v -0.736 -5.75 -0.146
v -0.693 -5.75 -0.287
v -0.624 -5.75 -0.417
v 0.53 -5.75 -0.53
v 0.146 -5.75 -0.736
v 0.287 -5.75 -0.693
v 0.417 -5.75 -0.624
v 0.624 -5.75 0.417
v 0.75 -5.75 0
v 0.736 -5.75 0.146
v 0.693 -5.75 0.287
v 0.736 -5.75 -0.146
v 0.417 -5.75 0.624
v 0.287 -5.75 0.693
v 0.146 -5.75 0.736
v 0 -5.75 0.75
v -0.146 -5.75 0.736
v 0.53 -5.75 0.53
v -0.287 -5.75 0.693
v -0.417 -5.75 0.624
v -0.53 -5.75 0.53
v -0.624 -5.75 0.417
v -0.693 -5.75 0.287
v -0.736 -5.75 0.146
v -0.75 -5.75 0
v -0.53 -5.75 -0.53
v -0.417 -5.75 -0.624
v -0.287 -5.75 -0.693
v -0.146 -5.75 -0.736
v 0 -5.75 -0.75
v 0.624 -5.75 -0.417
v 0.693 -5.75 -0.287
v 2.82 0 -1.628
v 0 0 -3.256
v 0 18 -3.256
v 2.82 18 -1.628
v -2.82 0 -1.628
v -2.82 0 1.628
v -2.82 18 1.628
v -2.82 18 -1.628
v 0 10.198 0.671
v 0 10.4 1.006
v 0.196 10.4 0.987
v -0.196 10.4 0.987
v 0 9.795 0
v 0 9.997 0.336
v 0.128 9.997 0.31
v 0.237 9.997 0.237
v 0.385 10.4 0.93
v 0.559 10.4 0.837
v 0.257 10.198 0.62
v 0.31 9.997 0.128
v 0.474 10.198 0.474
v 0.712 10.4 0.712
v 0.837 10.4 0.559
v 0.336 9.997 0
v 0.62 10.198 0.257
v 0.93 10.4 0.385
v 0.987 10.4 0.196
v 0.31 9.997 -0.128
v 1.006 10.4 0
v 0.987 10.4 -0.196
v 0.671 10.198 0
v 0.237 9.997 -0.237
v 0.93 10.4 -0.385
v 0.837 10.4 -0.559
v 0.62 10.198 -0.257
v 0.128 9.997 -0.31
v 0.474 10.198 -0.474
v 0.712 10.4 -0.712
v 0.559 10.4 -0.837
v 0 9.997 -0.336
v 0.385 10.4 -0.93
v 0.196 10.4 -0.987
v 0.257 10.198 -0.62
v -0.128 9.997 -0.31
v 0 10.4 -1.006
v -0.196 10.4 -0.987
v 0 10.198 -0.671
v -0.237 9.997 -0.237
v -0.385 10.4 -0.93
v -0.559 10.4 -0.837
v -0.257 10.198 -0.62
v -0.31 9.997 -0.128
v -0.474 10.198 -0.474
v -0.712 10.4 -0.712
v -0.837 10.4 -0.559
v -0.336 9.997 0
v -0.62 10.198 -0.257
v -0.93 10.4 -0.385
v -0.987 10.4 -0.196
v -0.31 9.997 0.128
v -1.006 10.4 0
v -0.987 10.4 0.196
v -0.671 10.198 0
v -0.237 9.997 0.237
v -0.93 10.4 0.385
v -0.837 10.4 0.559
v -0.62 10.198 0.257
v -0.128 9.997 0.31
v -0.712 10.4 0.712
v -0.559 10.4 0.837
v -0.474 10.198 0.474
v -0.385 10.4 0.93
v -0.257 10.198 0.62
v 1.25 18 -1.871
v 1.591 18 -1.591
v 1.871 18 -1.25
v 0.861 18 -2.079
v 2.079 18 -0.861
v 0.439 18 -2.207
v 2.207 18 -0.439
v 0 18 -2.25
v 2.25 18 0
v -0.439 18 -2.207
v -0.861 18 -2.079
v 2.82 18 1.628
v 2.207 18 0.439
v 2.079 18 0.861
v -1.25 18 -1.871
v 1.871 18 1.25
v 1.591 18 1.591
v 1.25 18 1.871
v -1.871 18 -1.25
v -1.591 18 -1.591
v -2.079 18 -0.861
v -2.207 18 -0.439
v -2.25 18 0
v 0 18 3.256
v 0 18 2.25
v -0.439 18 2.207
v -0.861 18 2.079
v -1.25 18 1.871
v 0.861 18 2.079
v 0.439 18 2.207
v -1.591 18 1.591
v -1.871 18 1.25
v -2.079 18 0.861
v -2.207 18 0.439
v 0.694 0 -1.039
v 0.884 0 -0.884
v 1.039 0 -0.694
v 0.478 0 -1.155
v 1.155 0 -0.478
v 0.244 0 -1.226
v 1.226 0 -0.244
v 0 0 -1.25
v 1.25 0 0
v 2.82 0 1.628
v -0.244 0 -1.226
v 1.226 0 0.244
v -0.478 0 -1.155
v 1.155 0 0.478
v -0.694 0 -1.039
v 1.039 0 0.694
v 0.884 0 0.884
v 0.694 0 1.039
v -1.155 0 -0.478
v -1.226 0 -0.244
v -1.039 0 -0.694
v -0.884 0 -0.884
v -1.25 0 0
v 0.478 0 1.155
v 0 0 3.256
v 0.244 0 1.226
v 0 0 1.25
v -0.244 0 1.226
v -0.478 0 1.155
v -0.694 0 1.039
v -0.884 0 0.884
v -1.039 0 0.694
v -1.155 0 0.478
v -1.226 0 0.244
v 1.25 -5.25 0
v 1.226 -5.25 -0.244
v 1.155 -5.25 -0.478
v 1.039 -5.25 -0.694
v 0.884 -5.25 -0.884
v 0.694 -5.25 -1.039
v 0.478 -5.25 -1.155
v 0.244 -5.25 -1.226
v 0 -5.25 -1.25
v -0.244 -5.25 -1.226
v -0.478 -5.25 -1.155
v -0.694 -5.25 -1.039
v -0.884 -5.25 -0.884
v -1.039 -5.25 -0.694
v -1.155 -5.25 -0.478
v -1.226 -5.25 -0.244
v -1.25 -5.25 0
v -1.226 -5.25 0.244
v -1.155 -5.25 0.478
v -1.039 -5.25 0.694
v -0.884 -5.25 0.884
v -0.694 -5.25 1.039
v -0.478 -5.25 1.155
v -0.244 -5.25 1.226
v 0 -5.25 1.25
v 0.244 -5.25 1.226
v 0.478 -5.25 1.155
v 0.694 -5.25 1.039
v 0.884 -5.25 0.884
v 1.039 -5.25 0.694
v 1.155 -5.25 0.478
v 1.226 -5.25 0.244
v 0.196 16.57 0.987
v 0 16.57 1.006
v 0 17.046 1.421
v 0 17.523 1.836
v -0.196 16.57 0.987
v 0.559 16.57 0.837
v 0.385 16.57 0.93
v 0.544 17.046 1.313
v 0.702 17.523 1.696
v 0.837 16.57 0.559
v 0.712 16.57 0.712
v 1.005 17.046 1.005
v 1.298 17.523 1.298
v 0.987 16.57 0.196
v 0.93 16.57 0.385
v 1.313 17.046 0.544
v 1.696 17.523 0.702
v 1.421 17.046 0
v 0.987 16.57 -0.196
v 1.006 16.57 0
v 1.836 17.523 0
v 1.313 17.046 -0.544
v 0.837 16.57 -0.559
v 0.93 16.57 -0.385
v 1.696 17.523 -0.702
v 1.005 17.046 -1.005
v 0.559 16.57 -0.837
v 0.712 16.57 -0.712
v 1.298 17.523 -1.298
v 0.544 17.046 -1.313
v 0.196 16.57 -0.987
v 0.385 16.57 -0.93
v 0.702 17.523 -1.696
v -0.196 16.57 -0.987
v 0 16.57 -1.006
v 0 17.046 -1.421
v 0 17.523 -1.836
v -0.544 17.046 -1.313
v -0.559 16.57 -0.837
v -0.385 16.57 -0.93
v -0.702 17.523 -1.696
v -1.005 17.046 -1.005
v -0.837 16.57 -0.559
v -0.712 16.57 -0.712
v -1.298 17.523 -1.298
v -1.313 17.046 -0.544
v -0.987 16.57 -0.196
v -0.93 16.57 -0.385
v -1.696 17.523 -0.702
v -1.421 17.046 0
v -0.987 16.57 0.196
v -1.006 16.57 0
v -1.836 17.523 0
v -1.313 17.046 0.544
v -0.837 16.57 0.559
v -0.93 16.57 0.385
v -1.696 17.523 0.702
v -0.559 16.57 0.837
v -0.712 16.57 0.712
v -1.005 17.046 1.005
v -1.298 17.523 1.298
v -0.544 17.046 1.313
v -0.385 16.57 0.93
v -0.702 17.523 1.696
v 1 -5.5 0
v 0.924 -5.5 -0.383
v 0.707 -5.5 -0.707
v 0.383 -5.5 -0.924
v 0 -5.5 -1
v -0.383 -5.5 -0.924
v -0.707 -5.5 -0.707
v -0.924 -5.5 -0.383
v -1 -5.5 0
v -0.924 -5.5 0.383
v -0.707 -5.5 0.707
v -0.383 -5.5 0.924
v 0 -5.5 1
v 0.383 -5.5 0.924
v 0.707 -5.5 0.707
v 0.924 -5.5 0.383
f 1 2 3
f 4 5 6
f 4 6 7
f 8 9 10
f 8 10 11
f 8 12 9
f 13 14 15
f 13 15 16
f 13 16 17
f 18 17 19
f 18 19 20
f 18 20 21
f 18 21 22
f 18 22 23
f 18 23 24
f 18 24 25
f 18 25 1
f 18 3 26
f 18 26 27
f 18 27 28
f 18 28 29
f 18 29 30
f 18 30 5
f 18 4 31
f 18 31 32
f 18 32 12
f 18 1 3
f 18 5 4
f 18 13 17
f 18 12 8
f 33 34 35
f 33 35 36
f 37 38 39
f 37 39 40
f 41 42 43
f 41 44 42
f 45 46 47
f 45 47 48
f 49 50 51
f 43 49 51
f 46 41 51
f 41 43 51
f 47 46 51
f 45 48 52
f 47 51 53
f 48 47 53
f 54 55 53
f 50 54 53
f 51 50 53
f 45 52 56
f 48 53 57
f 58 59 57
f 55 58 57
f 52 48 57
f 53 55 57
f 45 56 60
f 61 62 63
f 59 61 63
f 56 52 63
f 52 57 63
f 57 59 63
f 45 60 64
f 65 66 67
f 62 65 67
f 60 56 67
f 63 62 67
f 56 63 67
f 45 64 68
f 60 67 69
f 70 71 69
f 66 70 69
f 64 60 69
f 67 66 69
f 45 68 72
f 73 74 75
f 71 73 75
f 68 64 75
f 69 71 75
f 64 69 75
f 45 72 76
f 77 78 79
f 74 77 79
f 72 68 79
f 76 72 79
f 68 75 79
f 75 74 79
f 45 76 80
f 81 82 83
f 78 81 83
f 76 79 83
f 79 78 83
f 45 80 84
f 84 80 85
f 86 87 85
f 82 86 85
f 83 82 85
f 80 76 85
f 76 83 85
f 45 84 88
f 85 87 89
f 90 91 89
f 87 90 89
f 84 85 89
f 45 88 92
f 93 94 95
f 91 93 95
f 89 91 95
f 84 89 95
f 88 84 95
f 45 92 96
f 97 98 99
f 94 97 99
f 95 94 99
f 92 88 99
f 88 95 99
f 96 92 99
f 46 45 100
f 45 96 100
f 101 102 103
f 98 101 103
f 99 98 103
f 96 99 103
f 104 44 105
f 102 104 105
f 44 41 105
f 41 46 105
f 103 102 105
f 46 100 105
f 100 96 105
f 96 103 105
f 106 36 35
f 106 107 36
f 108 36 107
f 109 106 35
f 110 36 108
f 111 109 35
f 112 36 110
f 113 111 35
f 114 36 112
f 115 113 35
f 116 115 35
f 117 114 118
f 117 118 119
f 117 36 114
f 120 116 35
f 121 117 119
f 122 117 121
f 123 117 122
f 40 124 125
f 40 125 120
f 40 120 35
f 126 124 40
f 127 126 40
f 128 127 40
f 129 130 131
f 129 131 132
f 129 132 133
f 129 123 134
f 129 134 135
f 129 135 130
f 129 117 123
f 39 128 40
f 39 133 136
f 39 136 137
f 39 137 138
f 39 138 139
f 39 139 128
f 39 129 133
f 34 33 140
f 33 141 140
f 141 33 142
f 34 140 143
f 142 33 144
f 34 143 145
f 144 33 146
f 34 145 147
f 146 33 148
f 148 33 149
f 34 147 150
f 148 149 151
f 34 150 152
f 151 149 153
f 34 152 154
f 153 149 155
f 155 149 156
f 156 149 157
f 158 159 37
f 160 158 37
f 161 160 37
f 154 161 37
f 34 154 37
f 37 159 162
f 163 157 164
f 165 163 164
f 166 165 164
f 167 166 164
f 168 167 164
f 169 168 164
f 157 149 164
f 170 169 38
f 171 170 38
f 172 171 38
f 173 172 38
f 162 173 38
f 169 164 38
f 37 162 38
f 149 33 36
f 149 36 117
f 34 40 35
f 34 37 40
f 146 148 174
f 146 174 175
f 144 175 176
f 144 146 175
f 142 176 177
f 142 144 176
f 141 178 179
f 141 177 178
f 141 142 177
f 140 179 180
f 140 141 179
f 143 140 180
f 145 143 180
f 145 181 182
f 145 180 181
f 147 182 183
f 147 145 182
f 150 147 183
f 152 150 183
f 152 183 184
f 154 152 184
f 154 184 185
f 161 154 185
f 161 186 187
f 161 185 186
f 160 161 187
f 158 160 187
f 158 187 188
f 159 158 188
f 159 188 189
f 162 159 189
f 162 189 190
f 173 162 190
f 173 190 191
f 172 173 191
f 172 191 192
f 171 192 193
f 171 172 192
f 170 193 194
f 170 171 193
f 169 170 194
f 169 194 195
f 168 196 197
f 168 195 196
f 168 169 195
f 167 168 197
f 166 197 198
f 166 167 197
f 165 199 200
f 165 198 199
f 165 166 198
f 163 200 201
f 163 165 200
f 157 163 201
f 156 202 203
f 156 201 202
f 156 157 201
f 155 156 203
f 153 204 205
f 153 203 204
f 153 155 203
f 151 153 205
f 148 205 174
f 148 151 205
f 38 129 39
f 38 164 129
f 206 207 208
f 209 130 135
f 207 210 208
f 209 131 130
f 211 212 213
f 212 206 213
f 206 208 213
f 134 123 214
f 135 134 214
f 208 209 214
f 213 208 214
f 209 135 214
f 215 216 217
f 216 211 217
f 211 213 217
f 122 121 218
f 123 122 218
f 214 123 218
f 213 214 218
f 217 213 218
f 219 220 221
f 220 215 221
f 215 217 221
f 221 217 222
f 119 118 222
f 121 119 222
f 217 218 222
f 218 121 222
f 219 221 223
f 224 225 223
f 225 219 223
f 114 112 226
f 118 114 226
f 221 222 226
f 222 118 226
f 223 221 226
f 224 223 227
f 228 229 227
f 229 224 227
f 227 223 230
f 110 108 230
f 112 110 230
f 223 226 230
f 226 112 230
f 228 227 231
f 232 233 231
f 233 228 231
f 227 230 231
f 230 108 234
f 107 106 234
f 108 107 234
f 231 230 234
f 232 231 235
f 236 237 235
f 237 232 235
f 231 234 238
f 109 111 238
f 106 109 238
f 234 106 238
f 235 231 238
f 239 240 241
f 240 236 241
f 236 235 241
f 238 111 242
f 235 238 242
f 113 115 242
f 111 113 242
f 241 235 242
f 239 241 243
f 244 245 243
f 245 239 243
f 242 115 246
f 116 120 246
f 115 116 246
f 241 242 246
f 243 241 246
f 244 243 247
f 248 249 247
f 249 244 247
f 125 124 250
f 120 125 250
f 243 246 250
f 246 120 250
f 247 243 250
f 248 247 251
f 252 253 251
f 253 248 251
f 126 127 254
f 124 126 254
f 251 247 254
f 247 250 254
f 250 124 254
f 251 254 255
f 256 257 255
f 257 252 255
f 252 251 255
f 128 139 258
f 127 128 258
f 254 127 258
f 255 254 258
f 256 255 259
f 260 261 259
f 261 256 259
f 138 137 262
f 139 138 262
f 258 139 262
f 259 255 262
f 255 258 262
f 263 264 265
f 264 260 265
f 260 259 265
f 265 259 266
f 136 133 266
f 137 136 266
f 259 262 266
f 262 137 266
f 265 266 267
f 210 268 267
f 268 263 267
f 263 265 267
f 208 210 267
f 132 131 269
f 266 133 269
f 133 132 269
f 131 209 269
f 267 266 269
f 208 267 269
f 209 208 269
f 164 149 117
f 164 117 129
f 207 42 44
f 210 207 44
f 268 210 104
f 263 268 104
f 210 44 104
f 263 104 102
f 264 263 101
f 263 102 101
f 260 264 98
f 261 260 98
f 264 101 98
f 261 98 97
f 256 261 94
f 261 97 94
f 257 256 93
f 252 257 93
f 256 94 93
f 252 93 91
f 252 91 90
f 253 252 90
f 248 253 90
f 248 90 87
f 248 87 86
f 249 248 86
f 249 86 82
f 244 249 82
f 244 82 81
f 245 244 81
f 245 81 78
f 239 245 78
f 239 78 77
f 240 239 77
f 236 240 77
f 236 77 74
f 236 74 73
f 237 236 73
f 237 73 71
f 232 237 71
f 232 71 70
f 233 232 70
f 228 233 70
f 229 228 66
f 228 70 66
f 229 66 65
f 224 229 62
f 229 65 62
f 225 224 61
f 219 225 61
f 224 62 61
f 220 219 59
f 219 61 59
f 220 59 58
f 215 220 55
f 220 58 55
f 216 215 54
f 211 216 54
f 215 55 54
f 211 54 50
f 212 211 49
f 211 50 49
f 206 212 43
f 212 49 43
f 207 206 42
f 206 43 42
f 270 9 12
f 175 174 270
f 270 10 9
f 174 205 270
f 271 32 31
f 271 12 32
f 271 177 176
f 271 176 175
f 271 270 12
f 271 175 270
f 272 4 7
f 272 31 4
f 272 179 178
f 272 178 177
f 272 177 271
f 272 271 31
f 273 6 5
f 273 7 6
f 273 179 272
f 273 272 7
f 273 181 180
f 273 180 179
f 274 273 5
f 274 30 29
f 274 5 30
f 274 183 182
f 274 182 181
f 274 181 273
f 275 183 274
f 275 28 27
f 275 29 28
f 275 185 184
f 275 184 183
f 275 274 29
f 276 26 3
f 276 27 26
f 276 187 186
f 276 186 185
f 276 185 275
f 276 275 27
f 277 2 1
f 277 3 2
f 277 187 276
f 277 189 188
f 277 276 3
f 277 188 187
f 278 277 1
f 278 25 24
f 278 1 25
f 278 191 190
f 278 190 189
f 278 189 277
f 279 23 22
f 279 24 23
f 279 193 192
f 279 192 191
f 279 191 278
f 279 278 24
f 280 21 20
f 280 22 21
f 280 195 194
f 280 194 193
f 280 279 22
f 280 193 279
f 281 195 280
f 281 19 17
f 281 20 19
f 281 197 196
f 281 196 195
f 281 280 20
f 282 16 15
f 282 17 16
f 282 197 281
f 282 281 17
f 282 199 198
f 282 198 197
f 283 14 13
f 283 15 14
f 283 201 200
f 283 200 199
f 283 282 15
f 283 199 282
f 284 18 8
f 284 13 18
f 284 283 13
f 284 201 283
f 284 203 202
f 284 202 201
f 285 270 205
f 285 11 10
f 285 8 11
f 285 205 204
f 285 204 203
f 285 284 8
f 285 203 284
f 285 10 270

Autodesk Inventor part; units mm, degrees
ref_plane "YZ Plane" through (0, 0, 0) normal (1, 0, 0) x (0, 1, 0)
ref_plane "XZ Plane" through (0, 0, 0) normal (0, 1, 0) x (-1, 0, 0)
ref_plane "XY Plane" through (0, 0, 0) normal (0, 0, 1) x (1, 0, 0)
sketch "Sketch1" plane through (0, 0, 0) normal (0, 1, 0) x (-1, 0, 0)
  line L0 (0, 3.2563) -> (2.82, 1.6281)
  line L1 (2.82, 1.6281) -> (2.82, -1.6281)
  line L2 (2.82, -1.6281) -> (0, -3.2563)
  line L3 (0, -3.2563) -> (-2.82, -1.6281)
  line L4 (-2.82, -1.6281) -> (-2.82, 1.6281)
  line L5 (-2.82, 1.6281) -> (0, 3.2563)
  point P0 (0, 0)
  point P1 (0, 0)
  dimension "d0" = 5.64
extrude "Extrusion1" add sketch "Sketch1" along normal blind 18
sketch "Sketch2" plane through (0, 18, 0) normal (0, 1, 0) x (1, 0, 0)
  point P0 (0, 0)
  point P1 (0, 0)
hole "Hole1" at (0, 18, 0) direction (0, -1, 0) diameter 2.013 depth 7.6 tip angle 118 countersink diameter 4.5 countersink angle 82 thread size "M2.5x0.45" class "6H" standard "ANSI Metric M Profile"
sketch "Sketch3" plane through (0, 0, 0) normal (0, -1, 0) x (1, 0, 0)
  circle A0 centre (0, 0) radius 1.25
  dimension "d10" = 2.5
extrude "Extrusion2" add sketch "Sketch3" along normal blind 5.75
thread "Thread1" size "M2.5x0.45" class "6g" standard "ANSI Metric M Profile" full length
chamfer "Chamfer1" distance 0.5 angle 45 1 edges at (-1.25, -5.75, 0)
properties part number "2.5x18mm Standoff" material "Bronze, Soft Tin"
